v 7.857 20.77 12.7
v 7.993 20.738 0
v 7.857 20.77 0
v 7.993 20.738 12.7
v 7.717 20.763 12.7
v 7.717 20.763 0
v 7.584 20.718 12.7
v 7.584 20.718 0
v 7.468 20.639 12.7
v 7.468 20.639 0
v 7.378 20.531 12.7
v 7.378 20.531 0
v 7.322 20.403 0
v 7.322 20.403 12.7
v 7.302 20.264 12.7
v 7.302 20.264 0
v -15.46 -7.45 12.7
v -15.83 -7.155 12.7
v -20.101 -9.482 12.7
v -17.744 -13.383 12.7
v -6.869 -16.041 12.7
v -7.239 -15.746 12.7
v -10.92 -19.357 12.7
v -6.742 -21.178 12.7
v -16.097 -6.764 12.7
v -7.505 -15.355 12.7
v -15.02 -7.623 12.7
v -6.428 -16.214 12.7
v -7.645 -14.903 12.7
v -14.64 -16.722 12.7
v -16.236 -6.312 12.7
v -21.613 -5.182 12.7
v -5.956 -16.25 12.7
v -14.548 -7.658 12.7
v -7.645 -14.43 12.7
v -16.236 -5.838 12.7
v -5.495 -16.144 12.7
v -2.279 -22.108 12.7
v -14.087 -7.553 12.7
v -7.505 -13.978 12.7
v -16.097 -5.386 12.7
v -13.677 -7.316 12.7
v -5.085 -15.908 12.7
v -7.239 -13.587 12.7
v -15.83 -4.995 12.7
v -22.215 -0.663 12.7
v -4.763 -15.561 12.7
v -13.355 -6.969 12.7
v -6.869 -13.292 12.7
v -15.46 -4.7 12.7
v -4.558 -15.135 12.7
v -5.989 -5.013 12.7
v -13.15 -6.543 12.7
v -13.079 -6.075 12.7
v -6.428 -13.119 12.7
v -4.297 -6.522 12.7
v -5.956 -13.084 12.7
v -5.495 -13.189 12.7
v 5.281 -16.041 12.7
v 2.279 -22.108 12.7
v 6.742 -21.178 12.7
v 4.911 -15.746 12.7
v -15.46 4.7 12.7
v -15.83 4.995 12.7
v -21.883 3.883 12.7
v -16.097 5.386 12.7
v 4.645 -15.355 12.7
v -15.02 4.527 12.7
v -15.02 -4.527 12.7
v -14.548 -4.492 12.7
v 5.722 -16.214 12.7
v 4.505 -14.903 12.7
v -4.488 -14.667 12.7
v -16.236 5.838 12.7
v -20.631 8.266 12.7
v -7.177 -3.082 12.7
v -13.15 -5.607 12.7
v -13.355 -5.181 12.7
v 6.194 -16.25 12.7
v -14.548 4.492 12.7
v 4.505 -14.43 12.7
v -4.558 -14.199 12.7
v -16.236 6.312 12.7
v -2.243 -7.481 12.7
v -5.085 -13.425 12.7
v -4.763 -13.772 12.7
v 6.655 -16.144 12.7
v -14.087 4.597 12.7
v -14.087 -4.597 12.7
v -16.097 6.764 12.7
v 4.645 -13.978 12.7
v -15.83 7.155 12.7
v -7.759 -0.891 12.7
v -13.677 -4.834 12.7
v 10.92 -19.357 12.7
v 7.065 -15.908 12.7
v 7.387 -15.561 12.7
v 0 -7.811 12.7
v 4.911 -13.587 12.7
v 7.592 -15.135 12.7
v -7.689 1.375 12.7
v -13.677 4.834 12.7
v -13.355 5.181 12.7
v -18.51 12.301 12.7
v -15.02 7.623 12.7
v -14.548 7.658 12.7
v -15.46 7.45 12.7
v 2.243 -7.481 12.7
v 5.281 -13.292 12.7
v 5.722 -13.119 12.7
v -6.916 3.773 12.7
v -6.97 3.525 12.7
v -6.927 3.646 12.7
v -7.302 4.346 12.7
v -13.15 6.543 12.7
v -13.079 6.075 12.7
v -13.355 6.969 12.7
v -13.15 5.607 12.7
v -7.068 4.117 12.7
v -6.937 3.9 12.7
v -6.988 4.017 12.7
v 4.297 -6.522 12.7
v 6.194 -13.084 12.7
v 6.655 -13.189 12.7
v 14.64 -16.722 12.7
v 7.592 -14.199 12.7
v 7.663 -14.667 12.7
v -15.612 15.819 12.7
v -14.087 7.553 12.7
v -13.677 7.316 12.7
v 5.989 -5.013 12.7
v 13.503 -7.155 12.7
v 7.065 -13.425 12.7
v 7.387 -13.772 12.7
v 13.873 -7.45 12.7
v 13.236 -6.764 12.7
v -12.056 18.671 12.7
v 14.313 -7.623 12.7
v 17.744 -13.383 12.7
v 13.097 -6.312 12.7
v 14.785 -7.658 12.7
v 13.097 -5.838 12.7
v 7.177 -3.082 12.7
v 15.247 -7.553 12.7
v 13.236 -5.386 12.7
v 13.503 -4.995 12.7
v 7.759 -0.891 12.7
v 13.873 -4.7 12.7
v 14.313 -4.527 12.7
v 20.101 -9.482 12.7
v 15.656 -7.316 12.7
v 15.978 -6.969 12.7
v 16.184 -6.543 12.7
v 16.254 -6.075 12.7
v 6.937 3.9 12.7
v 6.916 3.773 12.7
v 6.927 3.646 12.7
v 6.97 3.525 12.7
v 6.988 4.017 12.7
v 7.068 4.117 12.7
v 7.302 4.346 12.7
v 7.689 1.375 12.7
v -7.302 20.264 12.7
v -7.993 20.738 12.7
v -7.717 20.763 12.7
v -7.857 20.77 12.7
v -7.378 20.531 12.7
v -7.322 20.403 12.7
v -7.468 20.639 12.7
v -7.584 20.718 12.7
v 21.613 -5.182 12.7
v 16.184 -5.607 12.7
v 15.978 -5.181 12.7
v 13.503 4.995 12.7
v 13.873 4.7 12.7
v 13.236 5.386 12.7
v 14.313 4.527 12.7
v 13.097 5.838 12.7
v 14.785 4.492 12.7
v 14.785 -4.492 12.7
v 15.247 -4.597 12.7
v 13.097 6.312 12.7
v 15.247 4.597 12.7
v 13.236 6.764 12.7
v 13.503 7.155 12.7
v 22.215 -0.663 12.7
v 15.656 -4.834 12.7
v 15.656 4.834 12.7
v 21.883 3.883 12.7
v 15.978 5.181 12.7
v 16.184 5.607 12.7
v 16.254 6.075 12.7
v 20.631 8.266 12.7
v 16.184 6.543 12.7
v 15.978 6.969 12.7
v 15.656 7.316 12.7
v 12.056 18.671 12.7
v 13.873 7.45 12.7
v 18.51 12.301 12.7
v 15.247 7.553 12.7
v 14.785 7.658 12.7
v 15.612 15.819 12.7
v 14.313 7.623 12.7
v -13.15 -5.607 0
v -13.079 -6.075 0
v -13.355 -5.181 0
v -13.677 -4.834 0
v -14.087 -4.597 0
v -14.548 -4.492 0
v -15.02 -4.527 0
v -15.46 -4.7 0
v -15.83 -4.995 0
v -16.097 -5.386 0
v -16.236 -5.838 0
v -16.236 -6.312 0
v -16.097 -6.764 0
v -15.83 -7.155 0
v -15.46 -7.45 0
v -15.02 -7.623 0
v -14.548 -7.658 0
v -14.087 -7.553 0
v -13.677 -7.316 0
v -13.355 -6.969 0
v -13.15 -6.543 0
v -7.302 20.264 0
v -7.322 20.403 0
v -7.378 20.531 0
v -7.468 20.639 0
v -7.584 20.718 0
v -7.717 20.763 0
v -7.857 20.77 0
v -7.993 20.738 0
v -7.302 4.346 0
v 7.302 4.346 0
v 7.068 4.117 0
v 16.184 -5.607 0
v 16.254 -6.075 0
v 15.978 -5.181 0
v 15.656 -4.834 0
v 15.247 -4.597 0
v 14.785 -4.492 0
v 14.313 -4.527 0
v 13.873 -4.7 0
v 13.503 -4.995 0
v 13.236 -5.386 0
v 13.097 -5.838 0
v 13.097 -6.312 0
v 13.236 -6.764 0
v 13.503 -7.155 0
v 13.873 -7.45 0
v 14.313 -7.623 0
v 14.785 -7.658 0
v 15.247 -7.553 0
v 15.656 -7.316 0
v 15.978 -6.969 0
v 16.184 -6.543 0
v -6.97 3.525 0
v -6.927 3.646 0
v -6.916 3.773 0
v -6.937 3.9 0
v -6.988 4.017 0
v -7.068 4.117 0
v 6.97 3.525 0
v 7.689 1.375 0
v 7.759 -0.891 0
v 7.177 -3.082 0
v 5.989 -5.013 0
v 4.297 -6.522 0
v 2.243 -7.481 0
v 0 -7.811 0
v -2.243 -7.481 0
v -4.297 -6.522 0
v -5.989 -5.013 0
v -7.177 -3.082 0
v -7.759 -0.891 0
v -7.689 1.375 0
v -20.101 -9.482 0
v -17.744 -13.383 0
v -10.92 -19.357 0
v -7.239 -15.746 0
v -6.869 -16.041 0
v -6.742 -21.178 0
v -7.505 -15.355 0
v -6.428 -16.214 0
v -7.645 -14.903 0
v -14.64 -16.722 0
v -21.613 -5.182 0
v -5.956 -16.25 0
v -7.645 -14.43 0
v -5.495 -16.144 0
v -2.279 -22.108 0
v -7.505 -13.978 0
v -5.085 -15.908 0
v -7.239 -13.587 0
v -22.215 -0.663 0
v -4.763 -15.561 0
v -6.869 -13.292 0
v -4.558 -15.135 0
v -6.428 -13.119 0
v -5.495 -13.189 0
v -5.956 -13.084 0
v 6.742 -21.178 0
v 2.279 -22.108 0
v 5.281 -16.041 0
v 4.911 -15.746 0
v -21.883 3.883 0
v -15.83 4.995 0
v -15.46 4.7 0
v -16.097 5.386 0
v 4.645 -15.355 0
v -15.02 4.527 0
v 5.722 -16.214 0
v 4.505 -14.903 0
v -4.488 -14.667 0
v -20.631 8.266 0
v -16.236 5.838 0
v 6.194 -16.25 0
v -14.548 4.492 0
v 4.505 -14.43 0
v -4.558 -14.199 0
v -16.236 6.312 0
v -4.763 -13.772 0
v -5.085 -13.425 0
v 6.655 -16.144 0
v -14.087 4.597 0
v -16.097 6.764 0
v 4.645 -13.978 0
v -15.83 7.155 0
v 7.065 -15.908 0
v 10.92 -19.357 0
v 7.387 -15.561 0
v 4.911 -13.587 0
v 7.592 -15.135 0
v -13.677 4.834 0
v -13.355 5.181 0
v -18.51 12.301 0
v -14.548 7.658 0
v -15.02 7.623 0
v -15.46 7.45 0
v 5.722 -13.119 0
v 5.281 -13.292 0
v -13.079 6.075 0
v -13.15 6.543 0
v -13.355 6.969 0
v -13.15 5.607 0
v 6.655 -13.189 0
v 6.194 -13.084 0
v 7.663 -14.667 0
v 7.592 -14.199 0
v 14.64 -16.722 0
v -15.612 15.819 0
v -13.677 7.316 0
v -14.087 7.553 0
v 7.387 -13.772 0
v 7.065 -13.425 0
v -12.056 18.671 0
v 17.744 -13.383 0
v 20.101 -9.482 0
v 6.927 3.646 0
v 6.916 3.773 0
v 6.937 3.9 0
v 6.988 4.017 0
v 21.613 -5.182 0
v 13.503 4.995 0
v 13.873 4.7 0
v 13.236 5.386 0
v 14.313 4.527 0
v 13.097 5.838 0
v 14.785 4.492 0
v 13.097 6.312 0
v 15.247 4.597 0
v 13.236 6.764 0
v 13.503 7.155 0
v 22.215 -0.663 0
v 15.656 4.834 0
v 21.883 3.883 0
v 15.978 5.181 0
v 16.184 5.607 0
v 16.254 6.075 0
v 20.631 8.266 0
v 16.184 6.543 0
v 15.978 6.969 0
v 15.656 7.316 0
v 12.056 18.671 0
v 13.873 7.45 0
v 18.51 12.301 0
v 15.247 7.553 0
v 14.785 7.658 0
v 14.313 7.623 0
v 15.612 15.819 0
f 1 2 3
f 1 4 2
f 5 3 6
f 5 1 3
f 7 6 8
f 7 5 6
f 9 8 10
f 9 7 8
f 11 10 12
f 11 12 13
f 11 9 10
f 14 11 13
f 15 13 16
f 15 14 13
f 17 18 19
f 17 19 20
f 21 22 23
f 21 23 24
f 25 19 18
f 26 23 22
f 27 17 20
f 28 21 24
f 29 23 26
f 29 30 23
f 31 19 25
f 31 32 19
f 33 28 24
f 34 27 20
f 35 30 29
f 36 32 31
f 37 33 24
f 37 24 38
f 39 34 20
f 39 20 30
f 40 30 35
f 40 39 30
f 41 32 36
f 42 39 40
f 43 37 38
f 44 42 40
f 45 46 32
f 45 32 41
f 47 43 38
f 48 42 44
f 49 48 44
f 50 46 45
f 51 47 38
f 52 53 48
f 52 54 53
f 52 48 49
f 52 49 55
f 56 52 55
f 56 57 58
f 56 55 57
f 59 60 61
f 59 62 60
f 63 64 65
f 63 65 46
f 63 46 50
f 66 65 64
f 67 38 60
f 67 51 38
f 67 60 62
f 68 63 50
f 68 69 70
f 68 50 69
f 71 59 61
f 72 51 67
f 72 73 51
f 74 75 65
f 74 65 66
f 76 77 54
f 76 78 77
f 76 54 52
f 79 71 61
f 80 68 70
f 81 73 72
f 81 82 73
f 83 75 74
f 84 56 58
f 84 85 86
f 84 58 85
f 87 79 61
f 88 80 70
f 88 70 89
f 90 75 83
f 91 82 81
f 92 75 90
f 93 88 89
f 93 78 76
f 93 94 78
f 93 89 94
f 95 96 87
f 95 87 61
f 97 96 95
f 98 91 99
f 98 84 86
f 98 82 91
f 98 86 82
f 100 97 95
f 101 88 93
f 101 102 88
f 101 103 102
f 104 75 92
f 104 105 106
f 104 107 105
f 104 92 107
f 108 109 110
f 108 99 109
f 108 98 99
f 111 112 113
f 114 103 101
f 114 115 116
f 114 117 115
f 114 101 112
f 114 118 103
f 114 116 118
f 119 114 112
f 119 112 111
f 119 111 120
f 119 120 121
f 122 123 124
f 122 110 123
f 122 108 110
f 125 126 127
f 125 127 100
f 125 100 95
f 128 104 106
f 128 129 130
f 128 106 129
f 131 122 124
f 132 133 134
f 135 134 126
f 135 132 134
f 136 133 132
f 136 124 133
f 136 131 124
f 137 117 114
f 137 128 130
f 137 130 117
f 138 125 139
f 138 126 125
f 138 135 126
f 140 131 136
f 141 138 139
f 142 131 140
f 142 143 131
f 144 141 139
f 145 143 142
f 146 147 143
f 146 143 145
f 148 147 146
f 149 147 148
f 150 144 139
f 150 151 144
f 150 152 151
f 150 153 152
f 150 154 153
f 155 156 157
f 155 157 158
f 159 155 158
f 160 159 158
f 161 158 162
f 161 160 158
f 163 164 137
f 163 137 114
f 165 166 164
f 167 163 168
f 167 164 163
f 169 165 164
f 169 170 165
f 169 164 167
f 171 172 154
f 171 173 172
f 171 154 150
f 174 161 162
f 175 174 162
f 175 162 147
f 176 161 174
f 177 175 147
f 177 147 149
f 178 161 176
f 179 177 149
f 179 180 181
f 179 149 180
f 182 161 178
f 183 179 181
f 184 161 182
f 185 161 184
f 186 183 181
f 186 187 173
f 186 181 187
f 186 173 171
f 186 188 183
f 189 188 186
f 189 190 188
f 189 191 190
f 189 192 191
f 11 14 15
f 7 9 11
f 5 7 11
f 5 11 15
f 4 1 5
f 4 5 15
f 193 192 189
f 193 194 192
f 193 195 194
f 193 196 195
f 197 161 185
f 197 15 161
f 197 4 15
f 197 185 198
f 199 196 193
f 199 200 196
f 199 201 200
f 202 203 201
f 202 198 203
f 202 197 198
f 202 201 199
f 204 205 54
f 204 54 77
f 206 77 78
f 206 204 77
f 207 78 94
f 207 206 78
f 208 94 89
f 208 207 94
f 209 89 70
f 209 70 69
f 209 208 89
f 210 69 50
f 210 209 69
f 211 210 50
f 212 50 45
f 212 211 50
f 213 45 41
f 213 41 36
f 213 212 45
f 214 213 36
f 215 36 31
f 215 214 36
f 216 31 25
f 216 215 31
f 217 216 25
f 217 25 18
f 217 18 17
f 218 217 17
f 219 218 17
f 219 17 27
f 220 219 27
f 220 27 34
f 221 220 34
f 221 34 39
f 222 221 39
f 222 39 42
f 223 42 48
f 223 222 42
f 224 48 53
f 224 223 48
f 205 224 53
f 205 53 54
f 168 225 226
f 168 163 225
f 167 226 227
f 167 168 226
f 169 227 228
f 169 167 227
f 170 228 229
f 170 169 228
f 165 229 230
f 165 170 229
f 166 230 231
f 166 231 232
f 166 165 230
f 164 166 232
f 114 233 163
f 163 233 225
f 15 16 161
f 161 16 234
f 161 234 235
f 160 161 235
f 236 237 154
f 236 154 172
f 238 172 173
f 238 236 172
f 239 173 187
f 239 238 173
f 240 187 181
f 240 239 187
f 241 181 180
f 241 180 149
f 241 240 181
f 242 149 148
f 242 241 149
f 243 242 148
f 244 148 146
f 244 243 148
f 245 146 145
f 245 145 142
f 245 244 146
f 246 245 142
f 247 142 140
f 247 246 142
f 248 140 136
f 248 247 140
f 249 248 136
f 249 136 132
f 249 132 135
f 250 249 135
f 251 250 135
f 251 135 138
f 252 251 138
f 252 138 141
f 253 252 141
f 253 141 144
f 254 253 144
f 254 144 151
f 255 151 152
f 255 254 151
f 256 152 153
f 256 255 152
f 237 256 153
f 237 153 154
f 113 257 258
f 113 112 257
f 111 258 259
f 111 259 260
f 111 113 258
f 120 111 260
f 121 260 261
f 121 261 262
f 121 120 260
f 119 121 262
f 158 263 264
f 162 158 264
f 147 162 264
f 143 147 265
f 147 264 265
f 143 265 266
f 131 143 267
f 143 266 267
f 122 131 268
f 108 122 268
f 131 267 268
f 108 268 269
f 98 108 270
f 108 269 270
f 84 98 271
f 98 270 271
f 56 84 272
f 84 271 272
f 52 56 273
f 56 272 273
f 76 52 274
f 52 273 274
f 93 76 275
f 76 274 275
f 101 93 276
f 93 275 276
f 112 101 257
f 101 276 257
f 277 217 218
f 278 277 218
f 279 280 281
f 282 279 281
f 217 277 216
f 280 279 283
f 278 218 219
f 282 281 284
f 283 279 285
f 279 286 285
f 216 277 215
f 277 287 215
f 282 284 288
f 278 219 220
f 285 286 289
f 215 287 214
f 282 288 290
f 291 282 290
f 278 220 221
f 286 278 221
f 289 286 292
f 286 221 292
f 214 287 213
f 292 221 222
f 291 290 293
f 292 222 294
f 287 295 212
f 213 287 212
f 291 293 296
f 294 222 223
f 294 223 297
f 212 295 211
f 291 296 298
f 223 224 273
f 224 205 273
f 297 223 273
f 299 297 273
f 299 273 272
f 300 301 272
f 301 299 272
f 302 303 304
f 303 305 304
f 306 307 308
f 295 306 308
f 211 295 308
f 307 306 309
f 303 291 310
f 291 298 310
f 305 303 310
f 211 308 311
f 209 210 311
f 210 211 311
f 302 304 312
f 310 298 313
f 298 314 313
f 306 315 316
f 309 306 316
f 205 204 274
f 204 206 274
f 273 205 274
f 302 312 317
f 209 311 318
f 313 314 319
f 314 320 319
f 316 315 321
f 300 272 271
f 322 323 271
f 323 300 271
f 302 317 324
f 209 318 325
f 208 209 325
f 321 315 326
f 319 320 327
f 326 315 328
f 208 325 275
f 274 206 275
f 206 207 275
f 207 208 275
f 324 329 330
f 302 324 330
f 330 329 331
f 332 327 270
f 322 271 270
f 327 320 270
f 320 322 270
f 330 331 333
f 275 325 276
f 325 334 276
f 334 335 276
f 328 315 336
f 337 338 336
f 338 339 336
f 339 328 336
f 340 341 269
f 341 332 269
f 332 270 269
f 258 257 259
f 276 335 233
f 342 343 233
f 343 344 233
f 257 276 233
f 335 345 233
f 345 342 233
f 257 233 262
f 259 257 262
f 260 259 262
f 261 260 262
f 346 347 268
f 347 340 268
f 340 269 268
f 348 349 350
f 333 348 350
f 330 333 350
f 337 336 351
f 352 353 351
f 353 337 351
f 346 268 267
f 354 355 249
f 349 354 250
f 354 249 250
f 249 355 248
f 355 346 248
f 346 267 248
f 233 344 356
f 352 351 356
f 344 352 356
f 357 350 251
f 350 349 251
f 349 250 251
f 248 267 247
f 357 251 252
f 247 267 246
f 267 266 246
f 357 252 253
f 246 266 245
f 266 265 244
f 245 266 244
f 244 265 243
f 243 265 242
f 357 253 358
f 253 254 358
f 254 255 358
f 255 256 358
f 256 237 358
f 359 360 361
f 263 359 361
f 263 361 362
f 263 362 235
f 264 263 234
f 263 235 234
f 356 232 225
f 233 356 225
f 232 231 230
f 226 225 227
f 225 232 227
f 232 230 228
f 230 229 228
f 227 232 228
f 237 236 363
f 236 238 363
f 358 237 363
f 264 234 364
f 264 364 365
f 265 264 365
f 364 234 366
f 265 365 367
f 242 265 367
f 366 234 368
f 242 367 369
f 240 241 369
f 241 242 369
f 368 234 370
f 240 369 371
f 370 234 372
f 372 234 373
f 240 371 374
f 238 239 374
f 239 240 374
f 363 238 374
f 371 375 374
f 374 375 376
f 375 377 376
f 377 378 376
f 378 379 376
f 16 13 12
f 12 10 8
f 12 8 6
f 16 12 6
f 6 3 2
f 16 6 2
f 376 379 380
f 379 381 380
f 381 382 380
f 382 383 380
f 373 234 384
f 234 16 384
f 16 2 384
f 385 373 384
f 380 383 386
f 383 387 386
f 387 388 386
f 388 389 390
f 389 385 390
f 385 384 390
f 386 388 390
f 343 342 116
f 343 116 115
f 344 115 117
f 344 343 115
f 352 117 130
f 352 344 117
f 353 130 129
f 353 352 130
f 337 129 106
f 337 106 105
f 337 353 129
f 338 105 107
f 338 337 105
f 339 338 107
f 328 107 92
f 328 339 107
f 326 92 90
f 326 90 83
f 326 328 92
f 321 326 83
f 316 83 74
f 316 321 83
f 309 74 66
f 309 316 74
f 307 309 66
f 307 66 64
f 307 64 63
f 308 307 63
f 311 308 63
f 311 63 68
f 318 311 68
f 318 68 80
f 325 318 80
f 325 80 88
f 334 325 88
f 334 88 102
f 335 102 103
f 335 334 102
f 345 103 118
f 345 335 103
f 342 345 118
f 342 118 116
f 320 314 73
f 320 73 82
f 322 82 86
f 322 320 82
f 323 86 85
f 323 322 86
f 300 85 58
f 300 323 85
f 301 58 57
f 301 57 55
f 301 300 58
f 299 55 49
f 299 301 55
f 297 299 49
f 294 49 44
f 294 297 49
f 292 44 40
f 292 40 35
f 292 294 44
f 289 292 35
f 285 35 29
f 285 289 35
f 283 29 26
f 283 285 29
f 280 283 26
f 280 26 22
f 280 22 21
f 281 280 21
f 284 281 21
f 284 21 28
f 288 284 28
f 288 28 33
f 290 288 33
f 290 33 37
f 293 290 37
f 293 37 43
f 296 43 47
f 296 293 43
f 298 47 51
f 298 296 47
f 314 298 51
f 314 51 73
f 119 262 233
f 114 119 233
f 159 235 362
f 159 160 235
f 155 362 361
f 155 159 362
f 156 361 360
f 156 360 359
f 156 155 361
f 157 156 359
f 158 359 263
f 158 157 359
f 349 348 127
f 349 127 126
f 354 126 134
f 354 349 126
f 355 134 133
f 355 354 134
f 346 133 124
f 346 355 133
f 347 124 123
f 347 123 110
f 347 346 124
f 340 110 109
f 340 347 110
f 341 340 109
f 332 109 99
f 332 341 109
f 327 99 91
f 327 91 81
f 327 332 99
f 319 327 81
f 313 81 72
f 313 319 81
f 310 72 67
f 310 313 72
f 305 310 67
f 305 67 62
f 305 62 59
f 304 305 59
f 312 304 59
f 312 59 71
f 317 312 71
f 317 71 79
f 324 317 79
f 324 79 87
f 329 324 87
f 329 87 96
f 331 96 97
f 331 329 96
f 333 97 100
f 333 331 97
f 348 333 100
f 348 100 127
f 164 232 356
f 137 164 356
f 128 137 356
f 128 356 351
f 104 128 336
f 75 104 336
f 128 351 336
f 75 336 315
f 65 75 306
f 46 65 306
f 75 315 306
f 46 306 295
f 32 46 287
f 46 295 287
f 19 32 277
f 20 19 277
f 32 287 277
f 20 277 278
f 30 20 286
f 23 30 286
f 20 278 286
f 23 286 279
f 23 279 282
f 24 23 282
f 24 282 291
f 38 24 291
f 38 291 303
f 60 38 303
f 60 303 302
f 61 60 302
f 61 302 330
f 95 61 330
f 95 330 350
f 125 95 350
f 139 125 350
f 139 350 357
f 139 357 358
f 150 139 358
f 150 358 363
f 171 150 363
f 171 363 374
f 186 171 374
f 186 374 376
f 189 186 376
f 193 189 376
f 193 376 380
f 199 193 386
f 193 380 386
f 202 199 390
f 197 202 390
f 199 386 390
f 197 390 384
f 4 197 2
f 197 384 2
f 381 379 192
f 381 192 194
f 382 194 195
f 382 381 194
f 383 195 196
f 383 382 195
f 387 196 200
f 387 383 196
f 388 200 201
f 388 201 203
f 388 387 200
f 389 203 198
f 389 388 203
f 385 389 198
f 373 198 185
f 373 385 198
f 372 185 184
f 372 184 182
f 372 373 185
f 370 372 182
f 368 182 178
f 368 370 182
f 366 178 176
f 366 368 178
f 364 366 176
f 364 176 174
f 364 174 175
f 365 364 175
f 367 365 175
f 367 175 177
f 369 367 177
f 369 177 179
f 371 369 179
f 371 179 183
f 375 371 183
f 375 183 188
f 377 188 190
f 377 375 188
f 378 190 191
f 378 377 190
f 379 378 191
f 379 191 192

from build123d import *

# Parameters (mm, degrees)
F3_DEPTH = 12.7
F4_R     = 0.508
F2_R     = 1.5875
F5_DEPTH = 12.7


# Not quite as in the source:
# - a variable given as a bare number and used for a length is read in inches; the dataset says mm whatever the document's units were


with BuildPart() as f3:
    # F1 (on Top) → F3 (new body)
    with BuildSketch(Plane.XY):
        with BuildLine():
            Line((-7.3025, 4.3464899063), (-7.3025, 20.9910485386))
            ThreePointArc((-7.3025, 20.9910485386), (0, -22.225), (7.3025, 20.9910485386))
            Line((7.3025, 20.9910485386), (7.3025, 4.3464899063))
            Line((7.3025, 4.3464899063), (6.7952360256, 3.8508022029))
            ThreePointArc((6.7952360256, 3.8508022029), (0, -7.8105), (-6.7952360256, 3.8508022029))
            Line((-6.7952360256, 3.8508022029), (-7.3025, 4.3464899063))
        make_face()
    extrude(amount=F3_DEPTH)

    # F4
    f4_edges = [f3.edges().sort_by_distance(p)[0] for p in [
        (-6.795236, 3.850802, 6.35),
        (6.795236, 3.850802, 6.35),
        (-7.3025, 20.991049, 6.35),
        (7.3025, 20.991049, 6.35),
    ]]
    fillet(f4_edges, radius=F4_R)

    # F2 (on Top) → F5 (cut, through all)
    with BuildSketch(Plane.XY):
        with Locations((-14.6665875786, 6.0750994888)):
            Circle(F2_R)
        with Locations((-14.6665875786, -6.0750994888)):
            Circle(F2_R)
        with Locations((-6.0750994888, -14.6665875786)):
            Circle(F2_R)
        with Locations((6.0750994888, -14.6665875786)):
            Circle(F2_R)
        with Locations((14.6665875786, -6.0750994888)):
            Circle(F2_R)
        with Locations((14.6665875786, 6.0750994888)):
            Circle(F2_R)
    extrude(amount=F5_DEPTH, mode=Mode.SUBTRACT)


solid = f3.part
